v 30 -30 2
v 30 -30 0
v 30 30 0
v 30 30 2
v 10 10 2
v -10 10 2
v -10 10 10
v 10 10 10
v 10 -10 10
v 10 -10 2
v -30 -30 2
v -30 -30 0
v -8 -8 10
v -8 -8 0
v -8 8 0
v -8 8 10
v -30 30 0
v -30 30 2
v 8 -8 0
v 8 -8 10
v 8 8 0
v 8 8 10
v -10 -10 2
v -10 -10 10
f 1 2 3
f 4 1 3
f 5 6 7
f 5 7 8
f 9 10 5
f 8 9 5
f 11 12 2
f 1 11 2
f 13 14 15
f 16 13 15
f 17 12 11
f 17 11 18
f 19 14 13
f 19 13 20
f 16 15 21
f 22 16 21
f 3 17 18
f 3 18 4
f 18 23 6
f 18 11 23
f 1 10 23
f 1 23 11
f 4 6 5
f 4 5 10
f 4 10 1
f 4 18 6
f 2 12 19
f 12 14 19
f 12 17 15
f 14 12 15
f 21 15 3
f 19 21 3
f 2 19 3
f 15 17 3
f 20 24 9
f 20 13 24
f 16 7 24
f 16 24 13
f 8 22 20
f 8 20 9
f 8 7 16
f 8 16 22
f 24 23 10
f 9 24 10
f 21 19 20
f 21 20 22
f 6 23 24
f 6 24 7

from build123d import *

# Parameters (mm, degrees)
BOX002_W     = 16
BOX002_H     = 16
BOX002_DEPTH = 10
BOX003_W     = 20
BOX003_H     = 20
BOX003_DEPTH = 10
BOX001_W     = 16
BOX001_H     = 16
BOX001_DEPTH = 3
BOX_W        = 60
BOX_H        = 60
BOX_DEPTH    = 2


with BuildPart() as cube002:
    # Box002 → Box002 (new body)
    with BuildSketch(Plane(origin=(-8, -8, 0), x_dir=(1, 0, 0), z_dir=(0, 0, 1))):
        with Locations((8, 8)):
            Rectangle(BOX002_W, BOX002_H)
    extrude(amount=BOX002_DEPTH)


with BuildPart() as cut001:
    # Box003 → Box003 (new body)
    with BuildSketch(Plane(origin=(-10, -10, 0), x_dir=(1, 0, 0), z_dir=(0, 0, 1))):
        with Locations((10, 10)):
            Rectangle(BOX003_W, BOX003_H)
    extrude(amount=BOX003_DEPTH)

    # Cut001: cut Cube002
    add(cube002.part, mode=Mode.SUBTRACT)


with BuildPart() as cube001:
    # Box001 → Box001 (new body)
    with BuildSketch(Plane(origin=(-8, -8, 0), x_dir=(1, 0, 0), z_dir=(0, 0, 1))):
        with Locations((8, 8)):
            Rectangle(BOX001_W, BOX001_H)
    extrude(amount=BOX001_DEPTH)


with BuildPart() as fusion:
    # Box → Box (new body)
    with BuildSketch(Plane(origin=(-30, -30, 0), x_dir=(1, 0, 0), z_dir=(0, 0, 1))):
        with Locations((30, 30)):
            Rectangle(BOX_W, BOX_H)
    extrude(amount=BOX_DEPTH)

    # Cut: cut Cube001
    add(cube001.part, mode=Mode.SUBTRACT)

    # Fusion: union Cut001
    add(cut001.part)


solid = fusion.part
